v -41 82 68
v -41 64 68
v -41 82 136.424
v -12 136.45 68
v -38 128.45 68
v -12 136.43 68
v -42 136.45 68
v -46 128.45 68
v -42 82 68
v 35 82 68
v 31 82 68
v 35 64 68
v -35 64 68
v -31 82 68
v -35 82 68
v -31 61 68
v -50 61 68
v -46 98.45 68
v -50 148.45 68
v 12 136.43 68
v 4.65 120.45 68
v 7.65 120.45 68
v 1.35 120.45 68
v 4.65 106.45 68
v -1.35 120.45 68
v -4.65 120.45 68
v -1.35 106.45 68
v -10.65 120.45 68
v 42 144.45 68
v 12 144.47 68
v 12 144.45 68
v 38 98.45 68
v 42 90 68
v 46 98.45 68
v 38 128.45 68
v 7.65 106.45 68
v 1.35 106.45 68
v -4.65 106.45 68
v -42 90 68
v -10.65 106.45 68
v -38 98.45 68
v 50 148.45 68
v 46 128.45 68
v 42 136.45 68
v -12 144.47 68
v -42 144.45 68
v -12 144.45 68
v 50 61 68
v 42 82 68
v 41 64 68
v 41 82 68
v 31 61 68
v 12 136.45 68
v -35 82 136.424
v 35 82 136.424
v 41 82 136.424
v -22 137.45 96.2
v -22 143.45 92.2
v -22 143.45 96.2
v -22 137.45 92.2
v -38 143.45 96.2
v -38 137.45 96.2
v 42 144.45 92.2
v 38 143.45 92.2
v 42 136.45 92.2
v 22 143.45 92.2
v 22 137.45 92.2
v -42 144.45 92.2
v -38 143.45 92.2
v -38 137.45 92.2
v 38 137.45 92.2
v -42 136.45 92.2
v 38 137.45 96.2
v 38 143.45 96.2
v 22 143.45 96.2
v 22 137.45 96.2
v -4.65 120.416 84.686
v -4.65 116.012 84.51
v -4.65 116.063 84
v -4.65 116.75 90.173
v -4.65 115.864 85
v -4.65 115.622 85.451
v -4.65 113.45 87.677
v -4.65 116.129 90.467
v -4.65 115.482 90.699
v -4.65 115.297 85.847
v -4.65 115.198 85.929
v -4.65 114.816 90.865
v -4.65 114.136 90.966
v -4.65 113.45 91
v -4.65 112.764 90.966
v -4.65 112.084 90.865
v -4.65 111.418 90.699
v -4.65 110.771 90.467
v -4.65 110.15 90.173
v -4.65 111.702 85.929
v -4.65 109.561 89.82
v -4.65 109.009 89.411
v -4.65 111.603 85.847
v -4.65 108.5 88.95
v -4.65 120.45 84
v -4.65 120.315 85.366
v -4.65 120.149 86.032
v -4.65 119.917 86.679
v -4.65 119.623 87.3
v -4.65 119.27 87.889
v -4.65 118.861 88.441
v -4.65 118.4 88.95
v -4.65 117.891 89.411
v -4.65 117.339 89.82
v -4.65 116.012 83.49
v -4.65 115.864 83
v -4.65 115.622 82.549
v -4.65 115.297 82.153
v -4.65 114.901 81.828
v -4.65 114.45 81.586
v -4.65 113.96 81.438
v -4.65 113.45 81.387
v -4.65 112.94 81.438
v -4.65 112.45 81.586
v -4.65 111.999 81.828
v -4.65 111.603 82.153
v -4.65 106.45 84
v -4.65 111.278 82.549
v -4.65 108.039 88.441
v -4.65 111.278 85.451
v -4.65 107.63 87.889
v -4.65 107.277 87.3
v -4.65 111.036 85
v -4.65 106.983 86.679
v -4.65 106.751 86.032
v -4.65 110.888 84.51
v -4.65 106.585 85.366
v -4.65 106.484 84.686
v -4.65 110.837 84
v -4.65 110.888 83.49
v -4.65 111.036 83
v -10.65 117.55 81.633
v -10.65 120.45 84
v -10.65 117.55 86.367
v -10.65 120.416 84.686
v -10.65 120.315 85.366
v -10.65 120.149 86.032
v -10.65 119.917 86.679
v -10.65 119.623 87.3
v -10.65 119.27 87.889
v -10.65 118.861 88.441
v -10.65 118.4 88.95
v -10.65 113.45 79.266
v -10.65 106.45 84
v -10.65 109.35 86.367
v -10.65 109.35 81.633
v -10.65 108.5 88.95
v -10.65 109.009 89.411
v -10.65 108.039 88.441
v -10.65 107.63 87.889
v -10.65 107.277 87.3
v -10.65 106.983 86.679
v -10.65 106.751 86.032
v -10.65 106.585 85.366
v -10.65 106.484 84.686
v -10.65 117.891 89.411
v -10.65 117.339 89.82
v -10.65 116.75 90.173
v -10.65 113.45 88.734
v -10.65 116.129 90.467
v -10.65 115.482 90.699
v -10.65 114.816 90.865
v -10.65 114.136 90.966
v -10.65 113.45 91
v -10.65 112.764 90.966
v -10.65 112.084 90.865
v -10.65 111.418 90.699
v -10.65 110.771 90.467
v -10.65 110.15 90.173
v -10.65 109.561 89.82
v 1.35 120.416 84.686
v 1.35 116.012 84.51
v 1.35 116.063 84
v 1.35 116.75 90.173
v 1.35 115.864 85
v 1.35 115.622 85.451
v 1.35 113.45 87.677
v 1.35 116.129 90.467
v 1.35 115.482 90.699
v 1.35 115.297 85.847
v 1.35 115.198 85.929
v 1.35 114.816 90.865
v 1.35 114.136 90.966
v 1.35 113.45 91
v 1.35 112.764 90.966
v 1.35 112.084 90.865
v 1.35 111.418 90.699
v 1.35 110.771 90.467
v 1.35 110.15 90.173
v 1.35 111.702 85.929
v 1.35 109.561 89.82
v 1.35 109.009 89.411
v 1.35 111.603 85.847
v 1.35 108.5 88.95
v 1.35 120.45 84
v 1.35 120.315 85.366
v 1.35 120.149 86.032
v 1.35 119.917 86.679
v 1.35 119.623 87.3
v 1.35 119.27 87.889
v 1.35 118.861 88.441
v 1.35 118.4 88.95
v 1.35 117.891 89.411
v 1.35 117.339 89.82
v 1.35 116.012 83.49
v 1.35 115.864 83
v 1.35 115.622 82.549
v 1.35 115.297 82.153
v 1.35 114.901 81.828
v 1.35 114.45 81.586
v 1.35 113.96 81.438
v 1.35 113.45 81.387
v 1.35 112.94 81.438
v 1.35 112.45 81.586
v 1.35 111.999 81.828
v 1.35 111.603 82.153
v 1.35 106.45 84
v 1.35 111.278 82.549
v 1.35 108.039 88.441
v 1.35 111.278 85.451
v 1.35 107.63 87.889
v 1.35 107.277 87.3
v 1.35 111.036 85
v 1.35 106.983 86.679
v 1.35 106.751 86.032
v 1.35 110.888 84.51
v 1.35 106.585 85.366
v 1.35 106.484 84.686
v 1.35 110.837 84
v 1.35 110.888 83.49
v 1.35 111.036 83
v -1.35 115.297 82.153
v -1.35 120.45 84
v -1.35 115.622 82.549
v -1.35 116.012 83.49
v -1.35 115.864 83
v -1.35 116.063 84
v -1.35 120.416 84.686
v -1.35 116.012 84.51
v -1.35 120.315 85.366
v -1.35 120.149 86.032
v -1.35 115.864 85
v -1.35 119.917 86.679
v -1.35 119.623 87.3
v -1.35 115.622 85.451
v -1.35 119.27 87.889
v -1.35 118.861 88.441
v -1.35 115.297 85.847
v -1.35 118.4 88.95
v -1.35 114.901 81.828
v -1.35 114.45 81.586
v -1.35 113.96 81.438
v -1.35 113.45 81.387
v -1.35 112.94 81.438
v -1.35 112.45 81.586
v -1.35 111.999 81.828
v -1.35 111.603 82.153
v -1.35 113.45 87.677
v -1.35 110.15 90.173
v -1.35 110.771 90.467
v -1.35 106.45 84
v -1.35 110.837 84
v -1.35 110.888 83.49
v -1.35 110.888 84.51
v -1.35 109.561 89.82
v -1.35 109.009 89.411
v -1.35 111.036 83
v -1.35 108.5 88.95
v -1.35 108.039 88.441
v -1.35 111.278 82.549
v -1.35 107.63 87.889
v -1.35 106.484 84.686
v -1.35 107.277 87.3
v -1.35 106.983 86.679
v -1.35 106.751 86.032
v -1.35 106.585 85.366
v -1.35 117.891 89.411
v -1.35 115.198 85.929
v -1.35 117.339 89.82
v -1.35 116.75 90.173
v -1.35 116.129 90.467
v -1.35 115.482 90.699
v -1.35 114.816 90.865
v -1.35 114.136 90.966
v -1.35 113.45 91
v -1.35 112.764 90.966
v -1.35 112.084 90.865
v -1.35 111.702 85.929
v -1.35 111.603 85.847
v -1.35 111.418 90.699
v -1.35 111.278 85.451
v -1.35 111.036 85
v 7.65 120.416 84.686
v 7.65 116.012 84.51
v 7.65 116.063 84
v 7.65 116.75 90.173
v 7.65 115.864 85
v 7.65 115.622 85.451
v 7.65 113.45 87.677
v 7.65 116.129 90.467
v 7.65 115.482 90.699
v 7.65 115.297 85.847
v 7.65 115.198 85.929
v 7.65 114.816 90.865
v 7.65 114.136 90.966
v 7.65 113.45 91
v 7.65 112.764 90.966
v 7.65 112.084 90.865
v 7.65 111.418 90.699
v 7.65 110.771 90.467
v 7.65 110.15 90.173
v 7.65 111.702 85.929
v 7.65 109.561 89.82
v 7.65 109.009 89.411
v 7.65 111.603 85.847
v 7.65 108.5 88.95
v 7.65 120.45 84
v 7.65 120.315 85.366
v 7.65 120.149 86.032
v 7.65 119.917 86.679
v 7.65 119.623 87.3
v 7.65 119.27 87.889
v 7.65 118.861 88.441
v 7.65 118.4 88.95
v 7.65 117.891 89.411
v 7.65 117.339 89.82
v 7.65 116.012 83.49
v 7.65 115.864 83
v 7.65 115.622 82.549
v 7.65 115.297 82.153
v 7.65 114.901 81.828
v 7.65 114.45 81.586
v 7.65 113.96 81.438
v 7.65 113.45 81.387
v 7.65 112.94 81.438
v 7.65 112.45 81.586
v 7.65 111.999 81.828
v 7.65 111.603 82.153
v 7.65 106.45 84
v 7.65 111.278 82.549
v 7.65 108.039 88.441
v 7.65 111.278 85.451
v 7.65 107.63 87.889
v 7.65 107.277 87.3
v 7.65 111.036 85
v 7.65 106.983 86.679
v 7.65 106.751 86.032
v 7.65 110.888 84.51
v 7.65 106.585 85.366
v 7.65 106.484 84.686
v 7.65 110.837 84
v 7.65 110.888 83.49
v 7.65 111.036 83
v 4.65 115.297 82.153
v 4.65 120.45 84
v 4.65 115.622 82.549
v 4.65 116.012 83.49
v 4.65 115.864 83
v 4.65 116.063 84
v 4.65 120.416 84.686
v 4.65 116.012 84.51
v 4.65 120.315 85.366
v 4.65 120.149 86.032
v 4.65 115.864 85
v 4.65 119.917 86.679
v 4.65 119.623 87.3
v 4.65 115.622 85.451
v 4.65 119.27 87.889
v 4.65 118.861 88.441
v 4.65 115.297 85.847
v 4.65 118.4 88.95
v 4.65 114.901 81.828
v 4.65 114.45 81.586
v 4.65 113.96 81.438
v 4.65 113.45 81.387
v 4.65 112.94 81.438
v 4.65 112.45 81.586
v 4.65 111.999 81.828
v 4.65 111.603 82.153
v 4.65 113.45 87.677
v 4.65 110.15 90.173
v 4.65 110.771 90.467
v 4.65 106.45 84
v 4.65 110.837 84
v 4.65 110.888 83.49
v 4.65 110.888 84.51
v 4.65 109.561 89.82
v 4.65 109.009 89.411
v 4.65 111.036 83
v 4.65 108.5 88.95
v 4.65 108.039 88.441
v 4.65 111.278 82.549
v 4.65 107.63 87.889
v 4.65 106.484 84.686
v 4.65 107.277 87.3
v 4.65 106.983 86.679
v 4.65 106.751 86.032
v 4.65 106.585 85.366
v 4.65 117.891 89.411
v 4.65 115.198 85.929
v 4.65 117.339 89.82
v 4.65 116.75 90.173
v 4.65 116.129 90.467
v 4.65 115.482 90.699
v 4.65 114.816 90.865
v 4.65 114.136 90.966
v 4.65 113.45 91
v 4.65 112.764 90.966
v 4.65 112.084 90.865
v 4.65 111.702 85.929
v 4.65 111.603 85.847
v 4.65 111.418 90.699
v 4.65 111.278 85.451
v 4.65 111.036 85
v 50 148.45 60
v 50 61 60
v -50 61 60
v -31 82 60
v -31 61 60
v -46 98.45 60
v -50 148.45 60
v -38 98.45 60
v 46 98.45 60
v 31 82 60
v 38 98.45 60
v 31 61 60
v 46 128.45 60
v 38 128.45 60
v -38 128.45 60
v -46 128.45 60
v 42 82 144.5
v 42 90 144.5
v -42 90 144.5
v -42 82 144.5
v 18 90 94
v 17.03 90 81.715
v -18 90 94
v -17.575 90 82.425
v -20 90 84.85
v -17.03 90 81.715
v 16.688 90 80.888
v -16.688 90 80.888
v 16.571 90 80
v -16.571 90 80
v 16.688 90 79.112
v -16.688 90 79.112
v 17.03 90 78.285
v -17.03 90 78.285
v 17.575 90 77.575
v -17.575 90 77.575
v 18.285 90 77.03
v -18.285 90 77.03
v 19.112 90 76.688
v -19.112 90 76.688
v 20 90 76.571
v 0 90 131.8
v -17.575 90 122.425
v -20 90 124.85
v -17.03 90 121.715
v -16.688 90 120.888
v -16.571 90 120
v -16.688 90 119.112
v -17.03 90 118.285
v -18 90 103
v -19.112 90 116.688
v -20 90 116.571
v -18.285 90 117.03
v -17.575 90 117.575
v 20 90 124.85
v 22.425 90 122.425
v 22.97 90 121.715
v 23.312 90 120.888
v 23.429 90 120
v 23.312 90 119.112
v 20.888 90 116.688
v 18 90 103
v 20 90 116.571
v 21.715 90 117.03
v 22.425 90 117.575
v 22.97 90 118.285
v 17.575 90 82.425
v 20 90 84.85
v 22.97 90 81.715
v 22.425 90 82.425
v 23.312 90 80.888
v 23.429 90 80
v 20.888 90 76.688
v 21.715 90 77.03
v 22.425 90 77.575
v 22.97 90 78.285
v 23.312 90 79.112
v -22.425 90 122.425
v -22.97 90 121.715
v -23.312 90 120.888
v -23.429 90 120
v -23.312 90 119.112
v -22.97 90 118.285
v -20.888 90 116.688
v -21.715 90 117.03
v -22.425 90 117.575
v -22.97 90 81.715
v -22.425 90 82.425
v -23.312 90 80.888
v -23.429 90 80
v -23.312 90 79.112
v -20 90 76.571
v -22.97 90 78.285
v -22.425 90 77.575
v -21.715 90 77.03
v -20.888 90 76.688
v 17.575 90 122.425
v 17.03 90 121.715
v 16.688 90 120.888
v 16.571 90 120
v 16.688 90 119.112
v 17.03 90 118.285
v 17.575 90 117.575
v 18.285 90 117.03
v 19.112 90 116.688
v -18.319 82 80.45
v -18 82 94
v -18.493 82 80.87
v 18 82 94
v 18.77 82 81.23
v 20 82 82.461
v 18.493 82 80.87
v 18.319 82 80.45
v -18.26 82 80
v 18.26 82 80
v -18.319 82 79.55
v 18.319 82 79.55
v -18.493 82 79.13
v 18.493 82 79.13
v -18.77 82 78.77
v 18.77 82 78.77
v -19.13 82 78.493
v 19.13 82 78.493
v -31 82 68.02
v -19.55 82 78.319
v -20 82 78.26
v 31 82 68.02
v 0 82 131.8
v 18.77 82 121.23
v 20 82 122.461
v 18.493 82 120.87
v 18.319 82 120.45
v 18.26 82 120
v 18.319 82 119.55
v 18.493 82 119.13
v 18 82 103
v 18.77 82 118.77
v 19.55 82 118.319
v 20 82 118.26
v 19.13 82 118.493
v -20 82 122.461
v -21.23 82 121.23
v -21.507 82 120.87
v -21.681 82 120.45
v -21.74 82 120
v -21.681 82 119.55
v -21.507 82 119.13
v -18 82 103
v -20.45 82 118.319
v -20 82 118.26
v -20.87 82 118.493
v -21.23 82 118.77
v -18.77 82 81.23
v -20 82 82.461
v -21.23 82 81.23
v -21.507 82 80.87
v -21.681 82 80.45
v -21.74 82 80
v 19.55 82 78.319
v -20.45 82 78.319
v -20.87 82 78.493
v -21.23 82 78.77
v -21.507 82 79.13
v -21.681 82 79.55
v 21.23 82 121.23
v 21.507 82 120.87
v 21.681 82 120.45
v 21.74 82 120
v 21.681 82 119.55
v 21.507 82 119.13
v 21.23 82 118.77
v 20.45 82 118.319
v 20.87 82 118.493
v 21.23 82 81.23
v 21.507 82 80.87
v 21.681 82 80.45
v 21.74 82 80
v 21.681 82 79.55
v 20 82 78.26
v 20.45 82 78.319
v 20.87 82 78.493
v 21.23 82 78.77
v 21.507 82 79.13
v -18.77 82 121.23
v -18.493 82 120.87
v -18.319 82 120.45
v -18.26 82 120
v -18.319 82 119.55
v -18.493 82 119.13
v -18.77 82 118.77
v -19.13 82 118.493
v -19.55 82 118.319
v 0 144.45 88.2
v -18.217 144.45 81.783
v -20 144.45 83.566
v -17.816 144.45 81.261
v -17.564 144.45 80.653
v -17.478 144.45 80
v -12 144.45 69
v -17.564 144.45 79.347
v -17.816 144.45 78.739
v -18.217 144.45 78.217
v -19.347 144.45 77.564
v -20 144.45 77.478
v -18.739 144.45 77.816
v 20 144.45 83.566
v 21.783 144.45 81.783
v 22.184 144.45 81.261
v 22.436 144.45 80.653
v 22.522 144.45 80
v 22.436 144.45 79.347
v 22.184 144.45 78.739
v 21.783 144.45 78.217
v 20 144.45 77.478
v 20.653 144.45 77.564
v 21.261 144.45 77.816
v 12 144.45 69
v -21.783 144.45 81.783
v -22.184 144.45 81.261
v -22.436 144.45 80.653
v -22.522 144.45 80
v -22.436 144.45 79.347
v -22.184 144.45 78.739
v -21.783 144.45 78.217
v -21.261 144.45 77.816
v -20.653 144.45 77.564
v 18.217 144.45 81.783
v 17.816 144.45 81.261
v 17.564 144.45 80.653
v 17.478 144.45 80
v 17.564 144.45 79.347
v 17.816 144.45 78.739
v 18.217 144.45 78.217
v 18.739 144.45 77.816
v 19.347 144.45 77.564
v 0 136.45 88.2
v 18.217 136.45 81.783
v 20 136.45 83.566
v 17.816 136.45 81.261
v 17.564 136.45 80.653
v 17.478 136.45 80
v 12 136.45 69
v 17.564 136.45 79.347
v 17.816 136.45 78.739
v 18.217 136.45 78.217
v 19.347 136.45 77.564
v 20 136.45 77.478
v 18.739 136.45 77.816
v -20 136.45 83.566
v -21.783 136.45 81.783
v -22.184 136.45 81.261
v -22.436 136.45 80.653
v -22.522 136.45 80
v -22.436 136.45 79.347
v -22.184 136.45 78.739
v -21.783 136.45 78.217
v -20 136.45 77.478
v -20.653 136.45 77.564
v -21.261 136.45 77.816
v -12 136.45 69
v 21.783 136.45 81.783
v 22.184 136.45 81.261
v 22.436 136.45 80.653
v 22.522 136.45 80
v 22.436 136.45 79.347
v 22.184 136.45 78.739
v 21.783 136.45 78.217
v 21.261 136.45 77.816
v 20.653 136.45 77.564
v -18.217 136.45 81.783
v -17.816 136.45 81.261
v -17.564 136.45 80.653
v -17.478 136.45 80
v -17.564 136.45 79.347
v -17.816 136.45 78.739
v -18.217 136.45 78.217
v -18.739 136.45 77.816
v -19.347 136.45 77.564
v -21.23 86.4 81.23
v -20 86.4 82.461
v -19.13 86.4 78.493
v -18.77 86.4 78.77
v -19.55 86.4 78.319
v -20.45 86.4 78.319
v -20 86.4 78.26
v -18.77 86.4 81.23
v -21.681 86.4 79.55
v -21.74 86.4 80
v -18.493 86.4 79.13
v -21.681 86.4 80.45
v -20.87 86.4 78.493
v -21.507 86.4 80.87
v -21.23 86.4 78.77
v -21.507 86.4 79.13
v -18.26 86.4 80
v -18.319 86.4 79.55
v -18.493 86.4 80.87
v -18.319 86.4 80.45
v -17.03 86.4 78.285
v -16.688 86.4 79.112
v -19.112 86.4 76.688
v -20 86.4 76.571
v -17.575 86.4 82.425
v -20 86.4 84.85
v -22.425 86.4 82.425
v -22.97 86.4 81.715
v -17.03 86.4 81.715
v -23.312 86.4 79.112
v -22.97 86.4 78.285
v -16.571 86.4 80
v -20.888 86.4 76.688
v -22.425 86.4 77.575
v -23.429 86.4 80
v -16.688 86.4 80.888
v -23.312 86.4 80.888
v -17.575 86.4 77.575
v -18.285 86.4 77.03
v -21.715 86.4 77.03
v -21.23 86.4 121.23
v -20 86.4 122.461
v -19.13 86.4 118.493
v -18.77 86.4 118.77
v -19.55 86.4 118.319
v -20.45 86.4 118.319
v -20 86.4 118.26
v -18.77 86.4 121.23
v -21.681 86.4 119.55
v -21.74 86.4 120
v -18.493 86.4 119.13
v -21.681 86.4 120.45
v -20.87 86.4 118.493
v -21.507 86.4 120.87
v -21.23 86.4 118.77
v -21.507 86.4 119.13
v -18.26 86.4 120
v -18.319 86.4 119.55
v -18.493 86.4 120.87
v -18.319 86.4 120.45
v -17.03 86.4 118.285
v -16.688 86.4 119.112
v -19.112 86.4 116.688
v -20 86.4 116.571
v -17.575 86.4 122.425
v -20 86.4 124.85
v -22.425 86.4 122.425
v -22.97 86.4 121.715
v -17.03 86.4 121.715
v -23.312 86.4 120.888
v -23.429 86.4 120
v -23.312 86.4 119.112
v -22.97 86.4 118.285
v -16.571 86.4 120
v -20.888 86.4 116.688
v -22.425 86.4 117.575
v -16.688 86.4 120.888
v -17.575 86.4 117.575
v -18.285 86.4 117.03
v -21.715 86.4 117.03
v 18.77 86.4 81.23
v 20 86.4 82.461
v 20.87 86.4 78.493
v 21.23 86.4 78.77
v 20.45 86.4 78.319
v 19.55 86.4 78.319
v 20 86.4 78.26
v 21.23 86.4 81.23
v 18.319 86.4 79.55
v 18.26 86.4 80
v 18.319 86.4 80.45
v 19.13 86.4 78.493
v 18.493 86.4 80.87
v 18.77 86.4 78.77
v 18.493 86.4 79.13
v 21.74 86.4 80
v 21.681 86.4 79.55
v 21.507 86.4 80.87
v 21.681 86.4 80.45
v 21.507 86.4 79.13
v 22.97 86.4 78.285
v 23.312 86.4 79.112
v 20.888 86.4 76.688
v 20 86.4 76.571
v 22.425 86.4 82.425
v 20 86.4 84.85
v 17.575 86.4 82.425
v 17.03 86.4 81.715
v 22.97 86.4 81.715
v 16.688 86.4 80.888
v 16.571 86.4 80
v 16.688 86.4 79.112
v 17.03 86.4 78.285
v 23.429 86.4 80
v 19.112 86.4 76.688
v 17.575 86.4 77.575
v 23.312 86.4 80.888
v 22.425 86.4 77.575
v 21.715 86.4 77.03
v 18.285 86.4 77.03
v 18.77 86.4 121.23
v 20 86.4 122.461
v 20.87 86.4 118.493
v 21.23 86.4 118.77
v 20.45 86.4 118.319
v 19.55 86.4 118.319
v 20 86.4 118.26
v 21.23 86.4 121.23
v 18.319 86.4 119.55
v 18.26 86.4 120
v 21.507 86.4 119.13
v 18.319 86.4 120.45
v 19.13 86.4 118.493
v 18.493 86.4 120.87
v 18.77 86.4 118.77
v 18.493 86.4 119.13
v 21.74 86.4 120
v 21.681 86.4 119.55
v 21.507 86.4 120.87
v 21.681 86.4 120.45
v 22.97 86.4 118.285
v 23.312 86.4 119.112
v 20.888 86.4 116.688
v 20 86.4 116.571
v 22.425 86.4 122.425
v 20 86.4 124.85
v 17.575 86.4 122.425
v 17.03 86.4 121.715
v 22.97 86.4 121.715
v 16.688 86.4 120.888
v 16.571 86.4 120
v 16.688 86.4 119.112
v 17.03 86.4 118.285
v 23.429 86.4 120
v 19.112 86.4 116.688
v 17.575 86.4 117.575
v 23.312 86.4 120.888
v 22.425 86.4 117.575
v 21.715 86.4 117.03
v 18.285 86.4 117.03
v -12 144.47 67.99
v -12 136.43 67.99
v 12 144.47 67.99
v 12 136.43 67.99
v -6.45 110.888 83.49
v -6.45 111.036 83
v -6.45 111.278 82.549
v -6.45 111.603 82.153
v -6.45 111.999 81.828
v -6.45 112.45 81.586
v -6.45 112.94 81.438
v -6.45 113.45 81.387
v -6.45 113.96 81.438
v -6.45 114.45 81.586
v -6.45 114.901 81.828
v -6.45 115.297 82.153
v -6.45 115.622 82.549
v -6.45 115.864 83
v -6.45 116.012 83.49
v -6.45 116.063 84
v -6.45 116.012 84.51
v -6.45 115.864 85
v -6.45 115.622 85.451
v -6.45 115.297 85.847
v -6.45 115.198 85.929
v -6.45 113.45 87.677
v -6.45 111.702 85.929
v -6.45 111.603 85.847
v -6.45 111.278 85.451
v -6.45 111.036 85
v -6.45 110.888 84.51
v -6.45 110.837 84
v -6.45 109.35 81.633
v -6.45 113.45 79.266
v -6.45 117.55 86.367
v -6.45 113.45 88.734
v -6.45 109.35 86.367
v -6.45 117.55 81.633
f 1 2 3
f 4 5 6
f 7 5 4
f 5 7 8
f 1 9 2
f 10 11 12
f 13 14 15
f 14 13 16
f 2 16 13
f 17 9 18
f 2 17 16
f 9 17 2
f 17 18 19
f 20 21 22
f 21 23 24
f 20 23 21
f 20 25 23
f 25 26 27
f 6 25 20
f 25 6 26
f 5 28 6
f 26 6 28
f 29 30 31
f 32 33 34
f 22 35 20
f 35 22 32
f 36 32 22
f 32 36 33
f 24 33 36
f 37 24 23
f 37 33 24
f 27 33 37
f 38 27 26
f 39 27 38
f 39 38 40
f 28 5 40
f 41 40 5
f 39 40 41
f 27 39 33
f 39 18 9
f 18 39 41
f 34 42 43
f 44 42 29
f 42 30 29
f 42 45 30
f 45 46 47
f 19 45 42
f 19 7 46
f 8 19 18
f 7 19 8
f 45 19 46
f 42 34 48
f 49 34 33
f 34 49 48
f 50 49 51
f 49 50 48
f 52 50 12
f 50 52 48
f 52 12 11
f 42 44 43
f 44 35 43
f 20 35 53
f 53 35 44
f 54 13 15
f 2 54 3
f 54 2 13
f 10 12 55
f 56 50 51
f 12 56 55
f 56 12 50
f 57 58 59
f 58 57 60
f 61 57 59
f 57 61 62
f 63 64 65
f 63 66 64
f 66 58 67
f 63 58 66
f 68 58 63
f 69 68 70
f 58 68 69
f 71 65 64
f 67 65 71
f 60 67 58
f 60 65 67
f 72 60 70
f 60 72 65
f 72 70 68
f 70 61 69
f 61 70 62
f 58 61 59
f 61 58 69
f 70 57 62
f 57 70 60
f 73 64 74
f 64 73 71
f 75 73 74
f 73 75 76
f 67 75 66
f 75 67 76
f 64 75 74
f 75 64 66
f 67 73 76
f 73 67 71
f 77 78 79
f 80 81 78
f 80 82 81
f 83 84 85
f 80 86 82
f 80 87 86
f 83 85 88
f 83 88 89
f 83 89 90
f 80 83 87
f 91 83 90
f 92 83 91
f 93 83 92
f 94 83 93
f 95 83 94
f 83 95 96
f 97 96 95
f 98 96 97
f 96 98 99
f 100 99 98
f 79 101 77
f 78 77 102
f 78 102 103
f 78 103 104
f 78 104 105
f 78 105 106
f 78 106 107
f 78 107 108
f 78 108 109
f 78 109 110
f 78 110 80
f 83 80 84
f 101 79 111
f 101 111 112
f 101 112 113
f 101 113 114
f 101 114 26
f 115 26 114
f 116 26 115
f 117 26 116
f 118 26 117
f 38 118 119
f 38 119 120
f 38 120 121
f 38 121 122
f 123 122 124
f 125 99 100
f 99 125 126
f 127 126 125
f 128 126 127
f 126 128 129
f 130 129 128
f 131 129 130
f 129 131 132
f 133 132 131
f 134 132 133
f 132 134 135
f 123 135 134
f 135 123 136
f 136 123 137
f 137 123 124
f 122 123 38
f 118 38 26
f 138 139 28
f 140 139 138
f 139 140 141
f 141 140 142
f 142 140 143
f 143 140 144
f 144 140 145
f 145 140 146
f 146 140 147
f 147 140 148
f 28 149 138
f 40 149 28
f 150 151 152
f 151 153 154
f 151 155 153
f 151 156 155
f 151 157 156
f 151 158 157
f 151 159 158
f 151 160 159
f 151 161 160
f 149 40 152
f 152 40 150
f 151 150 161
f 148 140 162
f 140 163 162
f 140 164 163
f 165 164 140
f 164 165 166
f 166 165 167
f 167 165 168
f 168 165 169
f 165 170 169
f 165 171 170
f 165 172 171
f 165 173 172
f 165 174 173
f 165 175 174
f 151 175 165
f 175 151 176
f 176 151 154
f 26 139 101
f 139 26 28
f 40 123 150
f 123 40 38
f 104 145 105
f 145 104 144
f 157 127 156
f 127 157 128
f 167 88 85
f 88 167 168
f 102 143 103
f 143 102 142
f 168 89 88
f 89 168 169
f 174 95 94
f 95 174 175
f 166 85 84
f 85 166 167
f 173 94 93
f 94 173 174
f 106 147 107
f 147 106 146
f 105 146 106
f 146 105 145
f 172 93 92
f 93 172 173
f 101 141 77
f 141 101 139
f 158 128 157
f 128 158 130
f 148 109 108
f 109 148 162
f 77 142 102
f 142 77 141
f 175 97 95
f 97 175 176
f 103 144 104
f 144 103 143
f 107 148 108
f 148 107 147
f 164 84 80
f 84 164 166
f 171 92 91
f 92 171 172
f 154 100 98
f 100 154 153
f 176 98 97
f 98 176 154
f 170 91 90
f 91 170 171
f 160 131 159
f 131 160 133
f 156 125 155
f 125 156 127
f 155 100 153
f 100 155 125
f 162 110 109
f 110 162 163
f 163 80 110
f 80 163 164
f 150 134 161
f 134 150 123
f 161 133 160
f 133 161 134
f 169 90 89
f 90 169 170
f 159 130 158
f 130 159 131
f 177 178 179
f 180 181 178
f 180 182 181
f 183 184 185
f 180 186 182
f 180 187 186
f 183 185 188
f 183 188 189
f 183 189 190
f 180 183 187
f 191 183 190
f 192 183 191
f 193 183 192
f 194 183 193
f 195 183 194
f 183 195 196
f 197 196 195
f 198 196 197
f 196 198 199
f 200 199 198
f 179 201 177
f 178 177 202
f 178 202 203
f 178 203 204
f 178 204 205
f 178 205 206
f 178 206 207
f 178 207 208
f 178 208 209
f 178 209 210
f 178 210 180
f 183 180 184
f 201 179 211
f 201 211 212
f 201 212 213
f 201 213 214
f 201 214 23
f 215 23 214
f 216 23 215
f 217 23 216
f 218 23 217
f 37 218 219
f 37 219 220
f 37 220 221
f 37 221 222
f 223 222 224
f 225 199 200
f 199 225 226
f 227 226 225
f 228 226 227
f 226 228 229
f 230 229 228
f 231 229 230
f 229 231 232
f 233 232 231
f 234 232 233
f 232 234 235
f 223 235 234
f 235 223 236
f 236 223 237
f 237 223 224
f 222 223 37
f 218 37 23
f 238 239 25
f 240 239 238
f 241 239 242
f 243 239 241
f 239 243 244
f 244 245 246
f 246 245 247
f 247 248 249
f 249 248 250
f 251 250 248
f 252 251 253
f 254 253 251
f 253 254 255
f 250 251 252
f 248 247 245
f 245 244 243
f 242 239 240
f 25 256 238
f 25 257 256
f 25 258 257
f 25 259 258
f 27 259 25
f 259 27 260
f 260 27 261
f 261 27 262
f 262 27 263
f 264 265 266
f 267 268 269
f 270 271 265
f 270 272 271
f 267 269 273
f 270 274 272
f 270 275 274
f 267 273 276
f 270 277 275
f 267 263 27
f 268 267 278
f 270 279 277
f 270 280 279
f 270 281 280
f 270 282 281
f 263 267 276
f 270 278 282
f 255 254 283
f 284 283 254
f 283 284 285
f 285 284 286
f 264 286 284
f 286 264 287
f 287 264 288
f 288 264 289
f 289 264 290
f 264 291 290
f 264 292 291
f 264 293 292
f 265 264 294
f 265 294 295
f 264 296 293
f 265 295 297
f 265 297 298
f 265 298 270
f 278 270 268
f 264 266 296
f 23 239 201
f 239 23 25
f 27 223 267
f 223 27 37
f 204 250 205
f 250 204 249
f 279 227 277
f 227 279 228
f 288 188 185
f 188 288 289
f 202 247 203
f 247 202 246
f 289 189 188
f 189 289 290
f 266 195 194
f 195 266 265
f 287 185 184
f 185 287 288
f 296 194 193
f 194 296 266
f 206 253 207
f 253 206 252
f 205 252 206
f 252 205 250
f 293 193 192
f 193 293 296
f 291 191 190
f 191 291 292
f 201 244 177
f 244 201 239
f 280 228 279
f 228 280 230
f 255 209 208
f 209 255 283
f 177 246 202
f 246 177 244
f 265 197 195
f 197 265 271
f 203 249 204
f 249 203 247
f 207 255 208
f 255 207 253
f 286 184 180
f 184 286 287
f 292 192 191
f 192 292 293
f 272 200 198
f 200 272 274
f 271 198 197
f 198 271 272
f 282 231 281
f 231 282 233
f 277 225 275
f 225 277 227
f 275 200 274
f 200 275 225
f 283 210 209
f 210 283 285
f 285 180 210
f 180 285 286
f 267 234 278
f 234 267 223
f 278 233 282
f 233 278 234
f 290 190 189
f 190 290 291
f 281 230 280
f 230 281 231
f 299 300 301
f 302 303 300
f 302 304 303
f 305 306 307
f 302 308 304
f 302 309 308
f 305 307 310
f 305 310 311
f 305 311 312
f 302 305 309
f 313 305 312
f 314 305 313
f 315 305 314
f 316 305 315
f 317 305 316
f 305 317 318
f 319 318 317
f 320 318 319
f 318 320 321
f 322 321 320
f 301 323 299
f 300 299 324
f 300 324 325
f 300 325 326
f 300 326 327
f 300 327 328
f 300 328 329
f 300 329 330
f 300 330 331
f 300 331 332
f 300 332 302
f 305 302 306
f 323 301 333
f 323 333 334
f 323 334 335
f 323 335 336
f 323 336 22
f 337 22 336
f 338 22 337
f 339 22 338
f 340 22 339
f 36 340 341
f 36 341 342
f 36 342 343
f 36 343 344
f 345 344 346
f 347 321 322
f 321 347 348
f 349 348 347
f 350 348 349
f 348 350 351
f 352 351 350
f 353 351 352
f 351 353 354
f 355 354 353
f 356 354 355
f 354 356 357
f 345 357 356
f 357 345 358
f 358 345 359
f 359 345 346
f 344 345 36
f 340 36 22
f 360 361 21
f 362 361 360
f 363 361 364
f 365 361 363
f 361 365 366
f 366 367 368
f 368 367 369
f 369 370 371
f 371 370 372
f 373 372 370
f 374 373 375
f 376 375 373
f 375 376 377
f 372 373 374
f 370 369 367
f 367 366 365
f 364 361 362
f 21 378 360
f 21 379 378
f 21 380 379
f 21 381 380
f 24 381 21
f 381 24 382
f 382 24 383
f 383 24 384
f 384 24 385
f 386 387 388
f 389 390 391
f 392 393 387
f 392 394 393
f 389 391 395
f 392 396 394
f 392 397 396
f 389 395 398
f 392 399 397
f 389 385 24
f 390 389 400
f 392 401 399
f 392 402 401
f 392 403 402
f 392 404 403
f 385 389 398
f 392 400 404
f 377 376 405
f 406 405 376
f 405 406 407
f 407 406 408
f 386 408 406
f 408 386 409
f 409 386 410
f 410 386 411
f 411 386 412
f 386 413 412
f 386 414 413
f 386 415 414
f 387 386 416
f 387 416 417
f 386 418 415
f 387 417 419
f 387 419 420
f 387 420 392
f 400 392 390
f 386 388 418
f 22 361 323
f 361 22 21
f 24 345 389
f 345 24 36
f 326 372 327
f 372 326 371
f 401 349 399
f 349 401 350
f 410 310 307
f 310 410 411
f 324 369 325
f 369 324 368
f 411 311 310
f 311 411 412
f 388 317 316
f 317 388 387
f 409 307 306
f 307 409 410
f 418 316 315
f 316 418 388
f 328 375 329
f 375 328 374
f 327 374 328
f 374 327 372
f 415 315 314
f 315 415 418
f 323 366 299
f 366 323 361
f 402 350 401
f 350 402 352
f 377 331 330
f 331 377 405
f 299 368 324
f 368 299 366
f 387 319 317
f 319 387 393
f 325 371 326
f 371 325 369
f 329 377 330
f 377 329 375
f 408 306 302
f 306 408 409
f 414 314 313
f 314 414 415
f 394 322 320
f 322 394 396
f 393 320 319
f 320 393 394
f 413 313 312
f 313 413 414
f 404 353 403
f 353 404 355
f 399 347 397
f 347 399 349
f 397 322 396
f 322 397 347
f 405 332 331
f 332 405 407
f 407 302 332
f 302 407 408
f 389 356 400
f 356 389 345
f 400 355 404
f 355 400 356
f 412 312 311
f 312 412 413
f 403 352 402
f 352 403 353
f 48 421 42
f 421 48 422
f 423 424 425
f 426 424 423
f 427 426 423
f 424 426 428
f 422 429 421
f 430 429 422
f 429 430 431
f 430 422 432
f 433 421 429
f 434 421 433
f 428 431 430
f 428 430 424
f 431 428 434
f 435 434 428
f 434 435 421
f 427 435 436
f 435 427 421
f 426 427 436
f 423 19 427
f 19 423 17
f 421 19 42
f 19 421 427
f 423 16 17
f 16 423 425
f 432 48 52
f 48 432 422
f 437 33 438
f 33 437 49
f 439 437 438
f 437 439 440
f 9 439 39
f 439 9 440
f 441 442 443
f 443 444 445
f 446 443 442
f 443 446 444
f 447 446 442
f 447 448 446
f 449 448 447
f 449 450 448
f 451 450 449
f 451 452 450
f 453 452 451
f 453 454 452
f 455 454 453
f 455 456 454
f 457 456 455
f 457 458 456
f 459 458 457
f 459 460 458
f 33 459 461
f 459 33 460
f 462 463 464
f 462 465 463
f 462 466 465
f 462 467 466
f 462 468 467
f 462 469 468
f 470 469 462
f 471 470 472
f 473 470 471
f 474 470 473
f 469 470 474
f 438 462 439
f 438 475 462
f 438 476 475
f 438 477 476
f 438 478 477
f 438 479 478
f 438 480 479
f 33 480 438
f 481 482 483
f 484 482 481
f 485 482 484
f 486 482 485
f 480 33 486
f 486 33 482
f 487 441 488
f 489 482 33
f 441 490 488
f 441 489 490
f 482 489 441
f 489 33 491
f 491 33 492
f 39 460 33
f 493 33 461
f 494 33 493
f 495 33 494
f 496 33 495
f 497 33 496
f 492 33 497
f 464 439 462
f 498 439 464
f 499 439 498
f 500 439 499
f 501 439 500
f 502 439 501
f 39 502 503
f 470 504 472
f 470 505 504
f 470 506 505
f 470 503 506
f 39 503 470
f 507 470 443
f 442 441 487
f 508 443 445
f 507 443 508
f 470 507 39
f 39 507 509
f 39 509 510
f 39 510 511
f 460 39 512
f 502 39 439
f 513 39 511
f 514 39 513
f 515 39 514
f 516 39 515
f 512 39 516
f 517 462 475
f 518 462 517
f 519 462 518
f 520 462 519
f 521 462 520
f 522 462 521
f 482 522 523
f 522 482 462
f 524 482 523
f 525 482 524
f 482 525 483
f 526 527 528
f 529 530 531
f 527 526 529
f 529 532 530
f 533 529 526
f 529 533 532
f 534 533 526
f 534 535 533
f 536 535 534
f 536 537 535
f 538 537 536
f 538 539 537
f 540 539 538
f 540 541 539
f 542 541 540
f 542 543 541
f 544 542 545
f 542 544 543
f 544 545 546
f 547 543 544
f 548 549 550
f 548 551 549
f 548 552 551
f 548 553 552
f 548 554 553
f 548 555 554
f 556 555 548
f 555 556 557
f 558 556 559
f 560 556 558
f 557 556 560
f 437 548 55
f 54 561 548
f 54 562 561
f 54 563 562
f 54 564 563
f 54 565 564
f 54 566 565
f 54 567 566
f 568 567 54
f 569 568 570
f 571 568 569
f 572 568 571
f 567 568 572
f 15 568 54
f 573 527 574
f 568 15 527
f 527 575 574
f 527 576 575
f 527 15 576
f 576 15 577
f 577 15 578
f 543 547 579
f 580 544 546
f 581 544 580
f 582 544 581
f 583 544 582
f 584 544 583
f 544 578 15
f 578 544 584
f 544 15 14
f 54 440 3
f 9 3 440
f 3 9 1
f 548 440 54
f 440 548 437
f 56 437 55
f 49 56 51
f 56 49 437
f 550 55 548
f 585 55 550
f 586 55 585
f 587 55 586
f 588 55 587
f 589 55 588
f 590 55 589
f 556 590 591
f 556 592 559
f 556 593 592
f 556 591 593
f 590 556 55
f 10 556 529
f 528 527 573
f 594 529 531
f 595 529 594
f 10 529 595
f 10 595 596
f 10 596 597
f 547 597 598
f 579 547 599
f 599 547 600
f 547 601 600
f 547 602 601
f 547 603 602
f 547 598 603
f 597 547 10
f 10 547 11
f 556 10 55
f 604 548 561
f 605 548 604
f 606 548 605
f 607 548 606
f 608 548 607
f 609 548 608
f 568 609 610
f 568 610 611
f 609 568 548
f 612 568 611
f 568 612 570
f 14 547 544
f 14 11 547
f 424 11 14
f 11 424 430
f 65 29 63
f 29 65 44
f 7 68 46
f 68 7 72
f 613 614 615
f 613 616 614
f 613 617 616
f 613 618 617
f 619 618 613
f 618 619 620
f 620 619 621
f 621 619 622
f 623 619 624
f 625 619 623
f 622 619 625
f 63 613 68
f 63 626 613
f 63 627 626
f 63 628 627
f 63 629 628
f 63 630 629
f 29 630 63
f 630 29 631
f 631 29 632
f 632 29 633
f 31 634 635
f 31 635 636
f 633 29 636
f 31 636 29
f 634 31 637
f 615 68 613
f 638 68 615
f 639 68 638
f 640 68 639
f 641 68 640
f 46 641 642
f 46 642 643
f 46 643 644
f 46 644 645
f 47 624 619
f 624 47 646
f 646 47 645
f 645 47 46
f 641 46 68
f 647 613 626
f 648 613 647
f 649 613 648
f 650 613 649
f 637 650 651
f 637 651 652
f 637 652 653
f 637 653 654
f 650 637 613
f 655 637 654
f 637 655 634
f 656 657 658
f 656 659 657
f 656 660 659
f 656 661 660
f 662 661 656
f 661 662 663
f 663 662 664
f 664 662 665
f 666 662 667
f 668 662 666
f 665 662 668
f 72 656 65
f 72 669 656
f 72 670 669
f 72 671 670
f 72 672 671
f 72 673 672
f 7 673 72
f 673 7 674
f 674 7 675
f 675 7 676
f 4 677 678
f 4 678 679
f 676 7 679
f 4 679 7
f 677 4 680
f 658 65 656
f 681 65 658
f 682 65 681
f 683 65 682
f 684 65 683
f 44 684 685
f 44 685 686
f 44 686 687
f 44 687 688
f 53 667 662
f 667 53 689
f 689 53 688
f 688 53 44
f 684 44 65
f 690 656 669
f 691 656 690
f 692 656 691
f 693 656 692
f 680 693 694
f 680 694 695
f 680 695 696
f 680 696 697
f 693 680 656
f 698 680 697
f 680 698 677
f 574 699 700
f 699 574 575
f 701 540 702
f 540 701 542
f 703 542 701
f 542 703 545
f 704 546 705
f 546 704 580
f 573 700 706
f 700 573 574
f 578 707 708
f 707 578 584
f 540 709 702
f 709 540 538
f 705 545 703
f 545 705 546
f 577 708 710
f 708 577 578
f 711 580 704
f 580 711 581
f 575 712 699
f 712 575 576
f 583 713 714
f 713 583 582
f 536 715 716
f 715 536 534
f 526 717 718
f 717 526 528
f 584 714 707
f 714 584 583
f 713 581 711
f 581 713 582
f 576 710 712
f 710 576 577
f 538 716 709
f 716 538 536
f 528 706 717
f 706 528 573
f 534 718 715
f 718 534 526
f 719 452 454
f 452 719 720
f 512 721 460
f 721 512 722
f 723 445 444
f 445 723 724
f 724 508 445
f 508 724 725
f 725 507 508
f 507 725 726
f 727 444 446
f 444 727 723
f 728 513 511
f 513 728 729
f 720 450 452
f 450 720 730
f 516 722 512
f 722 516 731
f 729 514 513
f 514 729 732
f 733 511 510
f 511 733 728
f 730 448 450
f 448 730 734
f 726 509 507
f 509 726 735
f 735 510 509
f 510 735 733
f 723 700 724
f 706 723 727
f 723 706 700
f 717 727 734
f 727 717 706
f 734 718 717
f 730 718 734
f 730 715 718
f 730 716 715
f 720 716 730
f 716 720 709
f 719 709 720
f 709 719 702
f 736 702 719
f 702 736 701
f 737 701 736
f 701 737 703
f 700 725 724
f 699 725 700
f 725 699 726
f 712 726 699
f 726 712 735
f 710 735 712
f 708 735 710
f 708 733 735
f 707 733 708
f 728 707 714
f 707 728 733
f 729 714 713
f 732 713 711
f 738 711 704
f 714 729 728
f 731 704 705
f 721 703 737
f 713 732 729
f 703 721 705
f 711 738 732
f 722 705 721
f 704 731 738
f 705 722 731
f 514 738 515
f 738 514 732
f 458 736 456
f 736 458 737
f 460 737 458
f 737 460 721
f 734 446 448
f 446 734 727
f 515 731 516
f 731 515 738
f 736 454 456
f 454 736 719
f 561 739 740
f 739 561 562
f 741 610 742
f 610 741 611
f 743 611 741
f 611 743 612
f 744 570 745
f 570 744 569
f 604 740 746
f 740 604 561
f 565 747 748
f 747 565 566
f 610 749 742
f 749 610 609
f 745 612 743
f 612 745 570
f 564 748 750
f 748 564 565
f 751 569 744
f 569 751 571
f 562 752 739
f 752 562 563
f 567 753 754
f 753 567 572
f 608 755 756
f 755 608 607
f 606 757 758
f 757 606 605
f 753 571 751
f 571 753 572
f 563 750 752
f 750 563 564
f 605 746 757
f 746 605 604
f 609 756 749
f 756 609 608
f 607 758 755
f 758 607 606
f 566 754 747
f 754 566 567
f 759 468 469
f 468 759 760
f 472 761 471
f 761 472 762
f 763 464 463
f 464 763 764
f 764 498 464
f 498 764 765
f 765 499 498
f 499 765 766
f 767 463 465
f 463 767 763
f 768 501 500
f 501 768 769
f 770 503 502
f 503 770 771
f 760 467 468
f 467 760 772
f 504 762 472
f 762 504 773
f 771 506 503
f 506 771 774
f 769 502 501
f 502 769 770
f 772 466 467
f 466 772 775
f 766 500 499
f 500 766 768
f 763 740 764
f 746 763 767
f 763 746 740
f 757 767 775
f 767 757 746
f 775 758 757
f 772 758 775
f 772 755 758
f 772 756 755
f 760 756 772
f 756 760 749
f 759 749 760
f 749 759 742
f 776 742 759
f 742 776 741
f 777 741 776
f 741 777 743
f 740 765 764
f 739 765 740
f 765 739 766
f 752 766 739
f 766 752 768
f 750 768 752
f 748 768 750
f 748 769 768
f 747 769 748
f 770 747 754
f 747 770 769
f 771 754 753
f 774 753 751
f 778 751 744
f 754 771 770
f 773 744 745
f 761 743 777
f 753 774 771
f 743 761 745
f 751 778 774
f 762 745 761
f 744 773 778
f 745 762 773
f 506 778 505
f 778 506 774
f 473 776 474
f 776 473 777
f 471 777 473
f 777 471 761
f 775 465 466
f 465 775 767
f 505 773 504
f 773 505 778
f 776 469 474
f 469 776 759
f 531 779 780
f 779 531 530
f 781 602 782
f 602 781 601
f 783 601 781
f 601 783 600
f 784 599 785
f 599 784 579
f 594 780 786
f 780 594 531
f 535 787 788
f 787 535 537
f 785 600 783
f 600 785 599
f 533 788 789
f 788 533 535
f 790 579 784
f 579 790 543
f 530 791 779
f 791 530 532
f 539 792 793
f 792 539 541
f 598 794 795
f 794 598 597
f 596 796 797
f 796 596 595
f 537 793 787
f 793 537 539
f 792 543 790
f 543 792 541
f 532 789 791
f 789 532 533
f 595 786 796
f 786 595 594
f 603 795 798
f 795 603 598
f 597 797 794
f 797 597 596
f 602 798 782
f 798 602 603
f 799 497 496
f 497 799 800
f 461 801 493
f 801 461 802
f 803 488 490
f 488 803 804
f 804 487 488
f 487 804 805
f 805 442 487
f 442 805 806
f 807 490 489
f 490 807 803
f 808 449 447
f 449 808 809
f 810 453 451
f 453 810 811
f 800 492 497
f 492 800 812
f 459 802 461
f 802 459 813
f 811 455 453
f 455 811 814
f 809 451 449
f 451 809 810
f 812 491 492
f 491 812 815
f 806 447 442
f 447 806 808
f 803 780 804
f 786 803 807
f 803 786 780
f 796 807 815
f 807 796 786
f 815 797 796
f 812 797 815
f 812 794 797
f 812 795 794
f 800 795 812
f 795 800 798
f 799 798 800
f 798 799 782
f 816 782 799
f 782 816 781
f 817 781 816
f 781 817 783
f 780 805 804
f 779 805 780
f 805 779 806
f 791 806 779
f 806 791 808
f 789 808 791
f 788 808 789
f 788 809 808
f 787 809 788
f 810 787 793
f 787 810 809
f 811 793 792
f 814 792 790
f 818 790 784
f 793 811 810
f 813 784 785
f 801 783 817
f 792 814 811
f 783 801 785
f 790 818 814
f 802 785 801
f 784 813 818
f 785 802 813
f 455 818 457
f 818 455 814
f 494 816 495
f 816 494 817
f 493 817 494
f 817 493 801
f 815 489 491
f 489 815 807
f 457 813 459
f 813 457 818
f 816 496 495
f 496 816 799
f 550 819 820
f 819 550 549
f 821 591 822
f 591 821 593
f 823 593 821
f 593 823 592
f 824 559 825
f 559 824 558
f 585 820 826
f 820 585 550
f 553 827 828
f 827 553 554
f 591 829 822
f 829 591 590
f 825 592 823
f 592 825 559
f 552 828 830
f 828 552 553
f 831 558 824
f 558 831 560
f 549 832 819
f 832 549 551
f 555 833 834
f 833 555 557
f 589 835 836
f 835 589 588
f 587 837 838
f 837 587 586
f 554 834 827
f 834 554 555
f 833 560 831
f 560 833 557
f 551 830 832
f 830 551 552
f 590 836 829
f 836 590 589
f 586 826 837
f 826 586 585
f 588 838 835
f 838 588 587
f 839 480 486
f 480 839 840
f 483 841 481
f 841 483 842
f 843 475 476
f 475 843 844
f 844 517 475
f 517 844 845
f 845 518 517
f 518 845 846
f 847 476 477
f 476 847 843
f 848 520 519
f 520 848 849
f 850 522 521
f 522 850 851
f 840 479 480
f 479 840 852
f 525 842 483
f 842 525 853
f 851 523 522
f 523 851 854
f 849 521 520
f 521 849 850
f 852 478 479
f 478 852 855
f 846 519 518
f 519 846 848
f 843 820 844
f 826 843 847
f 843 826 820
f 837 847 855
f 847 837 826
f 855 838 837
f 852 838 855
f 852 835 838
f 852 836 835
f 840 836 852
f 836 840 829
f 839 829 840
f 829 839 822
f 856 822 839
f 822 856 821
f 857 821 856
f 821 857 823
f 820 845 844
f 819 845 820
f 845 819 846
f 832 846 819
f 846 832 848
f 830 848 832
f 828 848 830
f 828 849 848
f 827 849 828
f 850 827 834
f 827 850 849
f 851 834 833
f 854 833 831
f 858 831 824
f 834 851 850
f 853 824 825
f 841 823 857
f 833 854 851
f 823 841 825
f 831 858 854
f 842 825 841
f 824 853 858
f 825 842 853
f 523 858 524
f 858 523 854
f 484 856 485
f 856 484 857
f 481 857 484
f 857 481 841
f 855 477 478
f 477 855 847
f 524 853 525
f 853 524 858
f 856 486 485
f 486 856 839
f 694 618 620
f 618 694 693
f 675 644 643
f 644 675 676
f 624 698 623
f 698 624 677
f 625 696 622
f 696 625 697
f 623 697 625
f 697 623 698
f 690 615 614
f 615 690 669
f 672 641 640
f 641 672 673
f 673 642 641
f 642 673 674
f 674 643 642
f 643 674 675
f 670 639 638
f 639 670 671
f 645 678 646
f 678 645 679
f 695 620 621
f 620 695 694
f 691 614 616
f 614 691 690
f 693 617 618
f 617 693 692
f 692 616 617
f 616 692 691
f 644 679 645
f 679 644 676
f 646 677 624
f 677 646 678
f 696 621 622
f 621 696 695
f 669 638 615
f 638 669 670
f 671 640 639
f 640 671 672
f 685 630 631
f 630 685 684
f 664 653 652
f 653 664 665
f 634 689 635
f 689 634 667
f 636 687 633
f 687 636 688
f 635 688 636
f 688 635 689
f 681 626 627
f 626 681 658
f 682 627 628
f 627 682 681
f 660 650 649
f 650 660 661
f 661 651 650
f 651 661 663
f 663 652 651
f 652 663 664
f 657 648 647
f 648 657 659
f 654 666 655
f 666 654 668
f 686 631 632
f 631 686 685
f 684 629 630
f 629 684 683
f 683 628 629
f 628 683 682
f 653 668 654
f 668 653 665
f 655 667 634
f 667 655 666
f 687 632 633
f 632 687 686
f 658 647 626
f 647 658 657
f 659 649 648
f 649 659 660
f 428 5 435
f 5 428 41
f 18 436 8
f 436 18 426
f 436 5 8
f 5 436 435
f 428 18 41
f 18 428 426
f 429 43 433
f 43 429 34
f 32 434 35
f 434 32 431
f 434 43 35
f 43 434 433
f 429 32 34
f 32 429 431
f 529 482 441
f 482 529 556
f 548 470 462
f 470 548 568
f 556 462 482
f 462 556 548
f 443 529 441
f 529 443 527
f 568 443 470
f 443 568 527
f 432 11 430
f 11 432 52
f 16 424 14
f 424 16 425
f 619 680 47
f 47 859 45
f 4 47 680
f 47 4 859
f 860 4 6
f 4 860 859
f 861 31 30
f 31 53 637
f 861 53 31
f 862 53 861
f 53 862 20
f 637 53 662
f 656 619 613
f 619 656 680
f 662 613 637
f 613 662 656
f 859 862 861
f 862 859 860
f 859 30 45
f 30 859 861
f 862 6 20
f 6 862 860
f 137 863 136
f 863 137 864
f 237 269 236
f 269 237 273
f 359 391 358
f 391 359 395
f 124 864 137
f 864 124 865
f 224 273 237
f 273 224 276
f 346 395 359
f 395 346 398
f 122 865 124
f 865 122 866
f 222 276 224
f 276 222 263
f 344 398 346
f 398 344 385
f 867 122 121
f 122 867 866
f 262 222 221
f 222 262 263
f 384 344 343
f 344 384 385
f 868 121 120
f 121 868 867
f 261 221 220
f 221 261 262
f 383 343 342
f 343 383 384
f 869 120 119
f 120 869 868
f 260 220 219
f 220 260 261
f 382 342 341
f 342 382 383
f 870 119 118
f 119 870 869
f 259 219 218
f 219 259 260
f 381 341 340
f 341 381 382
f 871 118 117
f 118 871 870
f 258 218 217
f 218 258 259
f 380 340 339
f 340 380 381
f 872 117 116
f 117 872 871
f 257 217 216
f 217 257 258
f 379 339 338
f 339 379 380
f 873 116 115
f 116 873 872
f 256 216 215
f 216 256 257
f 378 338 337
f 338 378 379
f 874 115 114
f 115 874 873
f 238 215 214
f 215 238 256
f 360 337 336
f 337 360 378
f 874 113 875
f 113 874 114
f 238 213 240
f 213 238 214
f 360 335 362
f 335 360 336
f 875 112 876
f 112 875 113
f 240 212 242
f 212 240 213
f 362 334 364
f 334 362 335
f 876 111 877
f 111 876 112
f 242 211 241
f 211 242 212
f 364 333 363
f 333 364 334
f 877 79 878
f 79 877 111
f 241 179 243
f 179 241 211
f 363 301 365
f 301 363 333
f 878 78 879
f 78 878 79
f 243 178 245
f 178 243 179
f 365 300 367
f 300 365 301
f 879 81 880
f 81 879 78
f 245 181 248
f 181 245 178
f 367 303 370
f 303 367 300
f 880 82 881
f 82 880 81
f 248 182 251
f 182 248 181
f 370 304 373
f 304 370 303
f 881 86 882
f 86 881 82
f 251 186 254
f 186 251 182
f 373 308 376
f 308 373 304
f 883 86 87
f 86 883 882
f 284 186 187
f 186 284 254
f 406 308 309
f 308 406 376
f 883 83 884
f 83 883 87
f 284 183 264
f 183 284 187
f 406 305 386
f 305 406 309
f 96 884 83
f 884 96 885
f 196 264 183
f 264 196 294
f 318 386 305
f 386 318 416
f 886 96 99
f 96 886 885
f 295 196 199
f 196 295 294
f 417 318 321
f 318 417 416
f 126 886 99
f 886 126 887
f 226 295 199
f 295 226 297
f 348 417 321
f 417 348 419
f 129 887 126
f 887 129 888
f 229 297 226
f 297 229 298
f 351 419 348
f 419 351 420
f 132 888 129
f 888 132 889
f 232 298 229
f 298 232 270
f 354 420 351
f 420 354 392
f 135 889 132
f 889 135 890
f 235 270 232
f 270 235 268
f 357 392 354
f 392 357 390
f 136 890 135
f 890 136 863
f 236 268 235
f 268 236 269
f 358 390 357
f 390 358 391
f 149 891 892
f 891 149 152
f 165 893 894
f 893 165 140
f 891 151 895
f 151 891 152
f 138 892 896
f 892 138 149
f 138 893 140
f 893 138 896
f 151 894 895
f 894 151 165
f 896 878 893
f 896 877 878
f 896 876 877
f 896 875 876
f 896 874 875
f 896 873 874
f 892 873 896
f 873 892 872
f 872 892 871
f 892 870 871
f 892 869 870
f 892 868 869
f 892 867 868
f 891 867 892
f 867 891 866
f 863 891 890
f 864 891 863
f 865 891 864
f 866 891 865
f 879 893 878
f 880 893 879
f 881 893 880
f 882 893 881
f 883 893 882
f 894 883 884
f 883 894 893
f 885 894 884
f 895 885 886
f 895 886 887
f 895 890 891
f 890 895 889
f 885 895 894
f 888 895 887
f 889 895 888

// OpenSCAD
// file: camera_mount.scad
// DJI osmo Action 6固定部品: rear plate + front support, one FDM solid.
// mm; +Y camera front; X screw axis; Z print up. Case shape provisional.
show_case=false;
tab_t=3; tab_gap=3; case_hole=5; body_to_axis=12.5;
fit=0.3; hole_allow=0.2;
case_w=95; case_d=45.9; case_h=75;
rear_gap=0.5; // fit with measured shim/liner, not an operating gap
base_w=100; base_t=8; axis_z=24;
plate_w=84; plate_t=8; plate_above_bottom=48;
rear_gusset_run=18; gusset_t=6; gusset_x=38;
front_wall_t=8; front_shift=front_wall_t; front_y=19+front_shift; front_span=84;
front_pad_w=16; front_pad_d=6; front_pad_x=30;
front_pad_raise=4; front_gap=0.3;
lug_r=7; nut_side_t=6; head_side_t=3;
nut_af=8.2; nut_depth=4.2; tool_r=14;
// CHILD-SIMPLE-M3-40x40 Rev.1: direct rear attachment.
mount_pitch=40; mount_center_z=40; mount_d=3.45;
head_d=6.8; head_depth=3.6; rear_clear_half=31;
$fn=64; eps=0.02;
assert(gusset_x-gusset_t/2>rear_clear_half);
assert(plate_t-head_depth>=4);
assert(mount_center_z-mount_pitch/2-head_d/2>base_t);
assert(mount_center_z+mount_pitch/2+head_d/2<84.5);
// Polygon roof points up in the Z print direction; circular clearance retained.
module roof_bore_y(x,y,z,d,depth) {
 r=d/2/cos(180/24);
 translate([x,y+eps,z]) rotate([90,0,0]) linear_extrude(depth+eps)
 polygon(concat([for(a=[135:15:405]) [r*cos(a),r*sin(a)]],[[0,r*sqrt(2)]]));
}
module rear_bore(x,z,d,depth) { roof_bore_y(x,rear_face,z,d,depth); }
mid=tab_gap-fit; slot=tab_t+fit;
stack=nut_side_t+2*slot+mid+head_side_t;
left=-(slot+mid/2+nut_side_t);
body_z=axis_z+body_to_axis;
contact_z=body_z-front_gap;
front_top=contact_z-front_pad_raise;
rear_face=-case_d/2-rear_gap; rear_back=rear_face-plate_t;
base_y0=rear_back-rear_gusset_run-3;
base_y1=front_y+front_wall_t/2+4;
plate_top=body_z+plate_above_bottom;
assert(mid>0 && nut_depth<nut_side_t-1);
assert(front_y-front_wall_t/2>tool_r && axis_z-tool_r>base_t);
assert(plate_above_bottom<case_h-15);
assert(gusset_x+gusset_t/2<plate_w/2);
assert(front_pad_x+front_pad_w/2<front_span/2);
assert(rear_gap>=0 && front_gap>=0);
module hole(d,h) { cylinder(d=d/cos(180/32),h=h,$fn=32); }
module roof_hole_x(d,h) {
 r=d/2;
 rotate([0,90,0]) linear_extrude(h) union() {
  circle(r=r/cos(180/32),$fn=32);
  polygon([[-sqrt(2)*r,0],[-r/sqrt(2),r/sqrt(2)],[-r/sqrt(2),-r/sqrt(2)]]);
 }
}
module rear_gusset(x) {
 translate([x-gusset_t/2,0,0])
 multmatrix([[0,0,1,0],[1,0,0,0],[0,1,0,0],[0,0,0,1]])
 linear_extrude(gusset_t)
 polygon([[rear_back-rear_gusset_run,base_t],[rear_back+eps,base_t],[rear_back+eps,plate_top-8]]);
}
// Modest reliefs: roof slopes exceed 55 degrees above the bed.
module roof_window_y(w,z0,shoulder) {
 translate([0,rear_back+plate_t/2,0]) rotate([90,0,0])
 linear_extrude(plate_t+2*eps,center=true)
 polygon([[-w/2,z0],[w/2,z0],[w/2,shoulder],[0,shoulder+w*0.8],[-w/2,shoulder]]);
}
module body() {
 difference() {
  union() {
   translate([-base_w/2,base_y0,0]) cube([base_w,base_y1-base_y0,base_t]);
   translate([-plate_w/2,rear_back,base_t]) cube([plate_w,plate_t,plate_top-base_t]);
   for(s=[-1,1]) rear_gusset(s*gusset_x);
   translate([-front_span/2,front_y-front_wall_t/2,base_t]) cube([front_span,front_wall_t,front_top-base_t]);
   for(s=[-1,1]) translate([s*front_pad_x-front_pad_w/2,front_y-front_pad_d/2,front_top]) cube([front_pad_w,front_pad_d,front_pad_raise]);
   // Minimum screw fingers only: rear under-case pedestal removed.
   starts=[left,-mid/2,mid/2+slot]; ts=[nut_side_t,mid,head_side_t];
   for(i=[0:2]) {
    translate([starts[i],-lug_r,base_t]) cube([ts[i],2*lug_r,axis_z-base_t]);
    translate([starts[i],0,axis_z]) rotate([0,90,0]) cylinder(r=lug_r,h=ts[i]);
   }
  }
  roof_window_y(36,34,43);
  // Clear the original rear base overhang so the rear face sits flush on the frame.
  translate([-rear_clear_half,base_y0-eps,-eps])
   cube([2*rear_clear_half,rear_back-base_y0+eps,base_t+2*eps]);
  for(x=[-mount_pitch/2,mount_pitch/2],z=[mount_center_z-mount_pitch/2,mount_center_z+mount_pitch/2]) {
   rear_bore(x,z,mount_d,plate_t+2*eps);
   // Recess M3 socket heads below the existing camera contact surface.
   rear_bore(x,z,head_d,head_depth);
  }
  // Straight hex-key access to the lower mounting bolts, camera removed.
  for(x=[-mount_pitch/2,mount_pitch/2])
   roof_bore_y(x,front_y+front_wall_t/2,mount_center_z-mount_pitch/2,5,front_wall_t+2*eps);
  // Two vertical base slots, clear of ribs, screw pads and support contacts.
  for(s=[-1,1]) translate([s*42-4,-15,-eps]) cube([8,30,base_t+2*eps]);
  // A peaked opening under the front support; retains a continuous top rail.
  translate([0,front_y,0]) rotate([90,0,0]) linear_extrude(front_wall_t+2*eps,center=true)
   polygon([[-12,base_t-0.01],[12,base_t-0.01],[12,9],[0,28.2],[-12,9]]);
  translate([left-eps,0,axis_z]) roof_hole_x(case_hole+hole_allow,stack+2*eps);
  translate([left-eps,0,axis_z]) rotate([0,90,0]) cylinder(d=nut_af/cos(30),h=nut_depth+eps,$fn=6);
  // Obsolete underside M5 attachment and its tool recesses removed.
 }
}
module camera_mount() { body(); }
color("SteelBlue") camera_mount();
if(show_case) %translate([-case_w/2,-case_d/2,body_z]) cube([case_w,case_d,case_h]);
// main file
use <camera_mount.scad>
// Rear face directly contacts frame at y=82; mounting center z=100.
translate([0,113.45,60]) color("SteelBlue") camera_mount();
